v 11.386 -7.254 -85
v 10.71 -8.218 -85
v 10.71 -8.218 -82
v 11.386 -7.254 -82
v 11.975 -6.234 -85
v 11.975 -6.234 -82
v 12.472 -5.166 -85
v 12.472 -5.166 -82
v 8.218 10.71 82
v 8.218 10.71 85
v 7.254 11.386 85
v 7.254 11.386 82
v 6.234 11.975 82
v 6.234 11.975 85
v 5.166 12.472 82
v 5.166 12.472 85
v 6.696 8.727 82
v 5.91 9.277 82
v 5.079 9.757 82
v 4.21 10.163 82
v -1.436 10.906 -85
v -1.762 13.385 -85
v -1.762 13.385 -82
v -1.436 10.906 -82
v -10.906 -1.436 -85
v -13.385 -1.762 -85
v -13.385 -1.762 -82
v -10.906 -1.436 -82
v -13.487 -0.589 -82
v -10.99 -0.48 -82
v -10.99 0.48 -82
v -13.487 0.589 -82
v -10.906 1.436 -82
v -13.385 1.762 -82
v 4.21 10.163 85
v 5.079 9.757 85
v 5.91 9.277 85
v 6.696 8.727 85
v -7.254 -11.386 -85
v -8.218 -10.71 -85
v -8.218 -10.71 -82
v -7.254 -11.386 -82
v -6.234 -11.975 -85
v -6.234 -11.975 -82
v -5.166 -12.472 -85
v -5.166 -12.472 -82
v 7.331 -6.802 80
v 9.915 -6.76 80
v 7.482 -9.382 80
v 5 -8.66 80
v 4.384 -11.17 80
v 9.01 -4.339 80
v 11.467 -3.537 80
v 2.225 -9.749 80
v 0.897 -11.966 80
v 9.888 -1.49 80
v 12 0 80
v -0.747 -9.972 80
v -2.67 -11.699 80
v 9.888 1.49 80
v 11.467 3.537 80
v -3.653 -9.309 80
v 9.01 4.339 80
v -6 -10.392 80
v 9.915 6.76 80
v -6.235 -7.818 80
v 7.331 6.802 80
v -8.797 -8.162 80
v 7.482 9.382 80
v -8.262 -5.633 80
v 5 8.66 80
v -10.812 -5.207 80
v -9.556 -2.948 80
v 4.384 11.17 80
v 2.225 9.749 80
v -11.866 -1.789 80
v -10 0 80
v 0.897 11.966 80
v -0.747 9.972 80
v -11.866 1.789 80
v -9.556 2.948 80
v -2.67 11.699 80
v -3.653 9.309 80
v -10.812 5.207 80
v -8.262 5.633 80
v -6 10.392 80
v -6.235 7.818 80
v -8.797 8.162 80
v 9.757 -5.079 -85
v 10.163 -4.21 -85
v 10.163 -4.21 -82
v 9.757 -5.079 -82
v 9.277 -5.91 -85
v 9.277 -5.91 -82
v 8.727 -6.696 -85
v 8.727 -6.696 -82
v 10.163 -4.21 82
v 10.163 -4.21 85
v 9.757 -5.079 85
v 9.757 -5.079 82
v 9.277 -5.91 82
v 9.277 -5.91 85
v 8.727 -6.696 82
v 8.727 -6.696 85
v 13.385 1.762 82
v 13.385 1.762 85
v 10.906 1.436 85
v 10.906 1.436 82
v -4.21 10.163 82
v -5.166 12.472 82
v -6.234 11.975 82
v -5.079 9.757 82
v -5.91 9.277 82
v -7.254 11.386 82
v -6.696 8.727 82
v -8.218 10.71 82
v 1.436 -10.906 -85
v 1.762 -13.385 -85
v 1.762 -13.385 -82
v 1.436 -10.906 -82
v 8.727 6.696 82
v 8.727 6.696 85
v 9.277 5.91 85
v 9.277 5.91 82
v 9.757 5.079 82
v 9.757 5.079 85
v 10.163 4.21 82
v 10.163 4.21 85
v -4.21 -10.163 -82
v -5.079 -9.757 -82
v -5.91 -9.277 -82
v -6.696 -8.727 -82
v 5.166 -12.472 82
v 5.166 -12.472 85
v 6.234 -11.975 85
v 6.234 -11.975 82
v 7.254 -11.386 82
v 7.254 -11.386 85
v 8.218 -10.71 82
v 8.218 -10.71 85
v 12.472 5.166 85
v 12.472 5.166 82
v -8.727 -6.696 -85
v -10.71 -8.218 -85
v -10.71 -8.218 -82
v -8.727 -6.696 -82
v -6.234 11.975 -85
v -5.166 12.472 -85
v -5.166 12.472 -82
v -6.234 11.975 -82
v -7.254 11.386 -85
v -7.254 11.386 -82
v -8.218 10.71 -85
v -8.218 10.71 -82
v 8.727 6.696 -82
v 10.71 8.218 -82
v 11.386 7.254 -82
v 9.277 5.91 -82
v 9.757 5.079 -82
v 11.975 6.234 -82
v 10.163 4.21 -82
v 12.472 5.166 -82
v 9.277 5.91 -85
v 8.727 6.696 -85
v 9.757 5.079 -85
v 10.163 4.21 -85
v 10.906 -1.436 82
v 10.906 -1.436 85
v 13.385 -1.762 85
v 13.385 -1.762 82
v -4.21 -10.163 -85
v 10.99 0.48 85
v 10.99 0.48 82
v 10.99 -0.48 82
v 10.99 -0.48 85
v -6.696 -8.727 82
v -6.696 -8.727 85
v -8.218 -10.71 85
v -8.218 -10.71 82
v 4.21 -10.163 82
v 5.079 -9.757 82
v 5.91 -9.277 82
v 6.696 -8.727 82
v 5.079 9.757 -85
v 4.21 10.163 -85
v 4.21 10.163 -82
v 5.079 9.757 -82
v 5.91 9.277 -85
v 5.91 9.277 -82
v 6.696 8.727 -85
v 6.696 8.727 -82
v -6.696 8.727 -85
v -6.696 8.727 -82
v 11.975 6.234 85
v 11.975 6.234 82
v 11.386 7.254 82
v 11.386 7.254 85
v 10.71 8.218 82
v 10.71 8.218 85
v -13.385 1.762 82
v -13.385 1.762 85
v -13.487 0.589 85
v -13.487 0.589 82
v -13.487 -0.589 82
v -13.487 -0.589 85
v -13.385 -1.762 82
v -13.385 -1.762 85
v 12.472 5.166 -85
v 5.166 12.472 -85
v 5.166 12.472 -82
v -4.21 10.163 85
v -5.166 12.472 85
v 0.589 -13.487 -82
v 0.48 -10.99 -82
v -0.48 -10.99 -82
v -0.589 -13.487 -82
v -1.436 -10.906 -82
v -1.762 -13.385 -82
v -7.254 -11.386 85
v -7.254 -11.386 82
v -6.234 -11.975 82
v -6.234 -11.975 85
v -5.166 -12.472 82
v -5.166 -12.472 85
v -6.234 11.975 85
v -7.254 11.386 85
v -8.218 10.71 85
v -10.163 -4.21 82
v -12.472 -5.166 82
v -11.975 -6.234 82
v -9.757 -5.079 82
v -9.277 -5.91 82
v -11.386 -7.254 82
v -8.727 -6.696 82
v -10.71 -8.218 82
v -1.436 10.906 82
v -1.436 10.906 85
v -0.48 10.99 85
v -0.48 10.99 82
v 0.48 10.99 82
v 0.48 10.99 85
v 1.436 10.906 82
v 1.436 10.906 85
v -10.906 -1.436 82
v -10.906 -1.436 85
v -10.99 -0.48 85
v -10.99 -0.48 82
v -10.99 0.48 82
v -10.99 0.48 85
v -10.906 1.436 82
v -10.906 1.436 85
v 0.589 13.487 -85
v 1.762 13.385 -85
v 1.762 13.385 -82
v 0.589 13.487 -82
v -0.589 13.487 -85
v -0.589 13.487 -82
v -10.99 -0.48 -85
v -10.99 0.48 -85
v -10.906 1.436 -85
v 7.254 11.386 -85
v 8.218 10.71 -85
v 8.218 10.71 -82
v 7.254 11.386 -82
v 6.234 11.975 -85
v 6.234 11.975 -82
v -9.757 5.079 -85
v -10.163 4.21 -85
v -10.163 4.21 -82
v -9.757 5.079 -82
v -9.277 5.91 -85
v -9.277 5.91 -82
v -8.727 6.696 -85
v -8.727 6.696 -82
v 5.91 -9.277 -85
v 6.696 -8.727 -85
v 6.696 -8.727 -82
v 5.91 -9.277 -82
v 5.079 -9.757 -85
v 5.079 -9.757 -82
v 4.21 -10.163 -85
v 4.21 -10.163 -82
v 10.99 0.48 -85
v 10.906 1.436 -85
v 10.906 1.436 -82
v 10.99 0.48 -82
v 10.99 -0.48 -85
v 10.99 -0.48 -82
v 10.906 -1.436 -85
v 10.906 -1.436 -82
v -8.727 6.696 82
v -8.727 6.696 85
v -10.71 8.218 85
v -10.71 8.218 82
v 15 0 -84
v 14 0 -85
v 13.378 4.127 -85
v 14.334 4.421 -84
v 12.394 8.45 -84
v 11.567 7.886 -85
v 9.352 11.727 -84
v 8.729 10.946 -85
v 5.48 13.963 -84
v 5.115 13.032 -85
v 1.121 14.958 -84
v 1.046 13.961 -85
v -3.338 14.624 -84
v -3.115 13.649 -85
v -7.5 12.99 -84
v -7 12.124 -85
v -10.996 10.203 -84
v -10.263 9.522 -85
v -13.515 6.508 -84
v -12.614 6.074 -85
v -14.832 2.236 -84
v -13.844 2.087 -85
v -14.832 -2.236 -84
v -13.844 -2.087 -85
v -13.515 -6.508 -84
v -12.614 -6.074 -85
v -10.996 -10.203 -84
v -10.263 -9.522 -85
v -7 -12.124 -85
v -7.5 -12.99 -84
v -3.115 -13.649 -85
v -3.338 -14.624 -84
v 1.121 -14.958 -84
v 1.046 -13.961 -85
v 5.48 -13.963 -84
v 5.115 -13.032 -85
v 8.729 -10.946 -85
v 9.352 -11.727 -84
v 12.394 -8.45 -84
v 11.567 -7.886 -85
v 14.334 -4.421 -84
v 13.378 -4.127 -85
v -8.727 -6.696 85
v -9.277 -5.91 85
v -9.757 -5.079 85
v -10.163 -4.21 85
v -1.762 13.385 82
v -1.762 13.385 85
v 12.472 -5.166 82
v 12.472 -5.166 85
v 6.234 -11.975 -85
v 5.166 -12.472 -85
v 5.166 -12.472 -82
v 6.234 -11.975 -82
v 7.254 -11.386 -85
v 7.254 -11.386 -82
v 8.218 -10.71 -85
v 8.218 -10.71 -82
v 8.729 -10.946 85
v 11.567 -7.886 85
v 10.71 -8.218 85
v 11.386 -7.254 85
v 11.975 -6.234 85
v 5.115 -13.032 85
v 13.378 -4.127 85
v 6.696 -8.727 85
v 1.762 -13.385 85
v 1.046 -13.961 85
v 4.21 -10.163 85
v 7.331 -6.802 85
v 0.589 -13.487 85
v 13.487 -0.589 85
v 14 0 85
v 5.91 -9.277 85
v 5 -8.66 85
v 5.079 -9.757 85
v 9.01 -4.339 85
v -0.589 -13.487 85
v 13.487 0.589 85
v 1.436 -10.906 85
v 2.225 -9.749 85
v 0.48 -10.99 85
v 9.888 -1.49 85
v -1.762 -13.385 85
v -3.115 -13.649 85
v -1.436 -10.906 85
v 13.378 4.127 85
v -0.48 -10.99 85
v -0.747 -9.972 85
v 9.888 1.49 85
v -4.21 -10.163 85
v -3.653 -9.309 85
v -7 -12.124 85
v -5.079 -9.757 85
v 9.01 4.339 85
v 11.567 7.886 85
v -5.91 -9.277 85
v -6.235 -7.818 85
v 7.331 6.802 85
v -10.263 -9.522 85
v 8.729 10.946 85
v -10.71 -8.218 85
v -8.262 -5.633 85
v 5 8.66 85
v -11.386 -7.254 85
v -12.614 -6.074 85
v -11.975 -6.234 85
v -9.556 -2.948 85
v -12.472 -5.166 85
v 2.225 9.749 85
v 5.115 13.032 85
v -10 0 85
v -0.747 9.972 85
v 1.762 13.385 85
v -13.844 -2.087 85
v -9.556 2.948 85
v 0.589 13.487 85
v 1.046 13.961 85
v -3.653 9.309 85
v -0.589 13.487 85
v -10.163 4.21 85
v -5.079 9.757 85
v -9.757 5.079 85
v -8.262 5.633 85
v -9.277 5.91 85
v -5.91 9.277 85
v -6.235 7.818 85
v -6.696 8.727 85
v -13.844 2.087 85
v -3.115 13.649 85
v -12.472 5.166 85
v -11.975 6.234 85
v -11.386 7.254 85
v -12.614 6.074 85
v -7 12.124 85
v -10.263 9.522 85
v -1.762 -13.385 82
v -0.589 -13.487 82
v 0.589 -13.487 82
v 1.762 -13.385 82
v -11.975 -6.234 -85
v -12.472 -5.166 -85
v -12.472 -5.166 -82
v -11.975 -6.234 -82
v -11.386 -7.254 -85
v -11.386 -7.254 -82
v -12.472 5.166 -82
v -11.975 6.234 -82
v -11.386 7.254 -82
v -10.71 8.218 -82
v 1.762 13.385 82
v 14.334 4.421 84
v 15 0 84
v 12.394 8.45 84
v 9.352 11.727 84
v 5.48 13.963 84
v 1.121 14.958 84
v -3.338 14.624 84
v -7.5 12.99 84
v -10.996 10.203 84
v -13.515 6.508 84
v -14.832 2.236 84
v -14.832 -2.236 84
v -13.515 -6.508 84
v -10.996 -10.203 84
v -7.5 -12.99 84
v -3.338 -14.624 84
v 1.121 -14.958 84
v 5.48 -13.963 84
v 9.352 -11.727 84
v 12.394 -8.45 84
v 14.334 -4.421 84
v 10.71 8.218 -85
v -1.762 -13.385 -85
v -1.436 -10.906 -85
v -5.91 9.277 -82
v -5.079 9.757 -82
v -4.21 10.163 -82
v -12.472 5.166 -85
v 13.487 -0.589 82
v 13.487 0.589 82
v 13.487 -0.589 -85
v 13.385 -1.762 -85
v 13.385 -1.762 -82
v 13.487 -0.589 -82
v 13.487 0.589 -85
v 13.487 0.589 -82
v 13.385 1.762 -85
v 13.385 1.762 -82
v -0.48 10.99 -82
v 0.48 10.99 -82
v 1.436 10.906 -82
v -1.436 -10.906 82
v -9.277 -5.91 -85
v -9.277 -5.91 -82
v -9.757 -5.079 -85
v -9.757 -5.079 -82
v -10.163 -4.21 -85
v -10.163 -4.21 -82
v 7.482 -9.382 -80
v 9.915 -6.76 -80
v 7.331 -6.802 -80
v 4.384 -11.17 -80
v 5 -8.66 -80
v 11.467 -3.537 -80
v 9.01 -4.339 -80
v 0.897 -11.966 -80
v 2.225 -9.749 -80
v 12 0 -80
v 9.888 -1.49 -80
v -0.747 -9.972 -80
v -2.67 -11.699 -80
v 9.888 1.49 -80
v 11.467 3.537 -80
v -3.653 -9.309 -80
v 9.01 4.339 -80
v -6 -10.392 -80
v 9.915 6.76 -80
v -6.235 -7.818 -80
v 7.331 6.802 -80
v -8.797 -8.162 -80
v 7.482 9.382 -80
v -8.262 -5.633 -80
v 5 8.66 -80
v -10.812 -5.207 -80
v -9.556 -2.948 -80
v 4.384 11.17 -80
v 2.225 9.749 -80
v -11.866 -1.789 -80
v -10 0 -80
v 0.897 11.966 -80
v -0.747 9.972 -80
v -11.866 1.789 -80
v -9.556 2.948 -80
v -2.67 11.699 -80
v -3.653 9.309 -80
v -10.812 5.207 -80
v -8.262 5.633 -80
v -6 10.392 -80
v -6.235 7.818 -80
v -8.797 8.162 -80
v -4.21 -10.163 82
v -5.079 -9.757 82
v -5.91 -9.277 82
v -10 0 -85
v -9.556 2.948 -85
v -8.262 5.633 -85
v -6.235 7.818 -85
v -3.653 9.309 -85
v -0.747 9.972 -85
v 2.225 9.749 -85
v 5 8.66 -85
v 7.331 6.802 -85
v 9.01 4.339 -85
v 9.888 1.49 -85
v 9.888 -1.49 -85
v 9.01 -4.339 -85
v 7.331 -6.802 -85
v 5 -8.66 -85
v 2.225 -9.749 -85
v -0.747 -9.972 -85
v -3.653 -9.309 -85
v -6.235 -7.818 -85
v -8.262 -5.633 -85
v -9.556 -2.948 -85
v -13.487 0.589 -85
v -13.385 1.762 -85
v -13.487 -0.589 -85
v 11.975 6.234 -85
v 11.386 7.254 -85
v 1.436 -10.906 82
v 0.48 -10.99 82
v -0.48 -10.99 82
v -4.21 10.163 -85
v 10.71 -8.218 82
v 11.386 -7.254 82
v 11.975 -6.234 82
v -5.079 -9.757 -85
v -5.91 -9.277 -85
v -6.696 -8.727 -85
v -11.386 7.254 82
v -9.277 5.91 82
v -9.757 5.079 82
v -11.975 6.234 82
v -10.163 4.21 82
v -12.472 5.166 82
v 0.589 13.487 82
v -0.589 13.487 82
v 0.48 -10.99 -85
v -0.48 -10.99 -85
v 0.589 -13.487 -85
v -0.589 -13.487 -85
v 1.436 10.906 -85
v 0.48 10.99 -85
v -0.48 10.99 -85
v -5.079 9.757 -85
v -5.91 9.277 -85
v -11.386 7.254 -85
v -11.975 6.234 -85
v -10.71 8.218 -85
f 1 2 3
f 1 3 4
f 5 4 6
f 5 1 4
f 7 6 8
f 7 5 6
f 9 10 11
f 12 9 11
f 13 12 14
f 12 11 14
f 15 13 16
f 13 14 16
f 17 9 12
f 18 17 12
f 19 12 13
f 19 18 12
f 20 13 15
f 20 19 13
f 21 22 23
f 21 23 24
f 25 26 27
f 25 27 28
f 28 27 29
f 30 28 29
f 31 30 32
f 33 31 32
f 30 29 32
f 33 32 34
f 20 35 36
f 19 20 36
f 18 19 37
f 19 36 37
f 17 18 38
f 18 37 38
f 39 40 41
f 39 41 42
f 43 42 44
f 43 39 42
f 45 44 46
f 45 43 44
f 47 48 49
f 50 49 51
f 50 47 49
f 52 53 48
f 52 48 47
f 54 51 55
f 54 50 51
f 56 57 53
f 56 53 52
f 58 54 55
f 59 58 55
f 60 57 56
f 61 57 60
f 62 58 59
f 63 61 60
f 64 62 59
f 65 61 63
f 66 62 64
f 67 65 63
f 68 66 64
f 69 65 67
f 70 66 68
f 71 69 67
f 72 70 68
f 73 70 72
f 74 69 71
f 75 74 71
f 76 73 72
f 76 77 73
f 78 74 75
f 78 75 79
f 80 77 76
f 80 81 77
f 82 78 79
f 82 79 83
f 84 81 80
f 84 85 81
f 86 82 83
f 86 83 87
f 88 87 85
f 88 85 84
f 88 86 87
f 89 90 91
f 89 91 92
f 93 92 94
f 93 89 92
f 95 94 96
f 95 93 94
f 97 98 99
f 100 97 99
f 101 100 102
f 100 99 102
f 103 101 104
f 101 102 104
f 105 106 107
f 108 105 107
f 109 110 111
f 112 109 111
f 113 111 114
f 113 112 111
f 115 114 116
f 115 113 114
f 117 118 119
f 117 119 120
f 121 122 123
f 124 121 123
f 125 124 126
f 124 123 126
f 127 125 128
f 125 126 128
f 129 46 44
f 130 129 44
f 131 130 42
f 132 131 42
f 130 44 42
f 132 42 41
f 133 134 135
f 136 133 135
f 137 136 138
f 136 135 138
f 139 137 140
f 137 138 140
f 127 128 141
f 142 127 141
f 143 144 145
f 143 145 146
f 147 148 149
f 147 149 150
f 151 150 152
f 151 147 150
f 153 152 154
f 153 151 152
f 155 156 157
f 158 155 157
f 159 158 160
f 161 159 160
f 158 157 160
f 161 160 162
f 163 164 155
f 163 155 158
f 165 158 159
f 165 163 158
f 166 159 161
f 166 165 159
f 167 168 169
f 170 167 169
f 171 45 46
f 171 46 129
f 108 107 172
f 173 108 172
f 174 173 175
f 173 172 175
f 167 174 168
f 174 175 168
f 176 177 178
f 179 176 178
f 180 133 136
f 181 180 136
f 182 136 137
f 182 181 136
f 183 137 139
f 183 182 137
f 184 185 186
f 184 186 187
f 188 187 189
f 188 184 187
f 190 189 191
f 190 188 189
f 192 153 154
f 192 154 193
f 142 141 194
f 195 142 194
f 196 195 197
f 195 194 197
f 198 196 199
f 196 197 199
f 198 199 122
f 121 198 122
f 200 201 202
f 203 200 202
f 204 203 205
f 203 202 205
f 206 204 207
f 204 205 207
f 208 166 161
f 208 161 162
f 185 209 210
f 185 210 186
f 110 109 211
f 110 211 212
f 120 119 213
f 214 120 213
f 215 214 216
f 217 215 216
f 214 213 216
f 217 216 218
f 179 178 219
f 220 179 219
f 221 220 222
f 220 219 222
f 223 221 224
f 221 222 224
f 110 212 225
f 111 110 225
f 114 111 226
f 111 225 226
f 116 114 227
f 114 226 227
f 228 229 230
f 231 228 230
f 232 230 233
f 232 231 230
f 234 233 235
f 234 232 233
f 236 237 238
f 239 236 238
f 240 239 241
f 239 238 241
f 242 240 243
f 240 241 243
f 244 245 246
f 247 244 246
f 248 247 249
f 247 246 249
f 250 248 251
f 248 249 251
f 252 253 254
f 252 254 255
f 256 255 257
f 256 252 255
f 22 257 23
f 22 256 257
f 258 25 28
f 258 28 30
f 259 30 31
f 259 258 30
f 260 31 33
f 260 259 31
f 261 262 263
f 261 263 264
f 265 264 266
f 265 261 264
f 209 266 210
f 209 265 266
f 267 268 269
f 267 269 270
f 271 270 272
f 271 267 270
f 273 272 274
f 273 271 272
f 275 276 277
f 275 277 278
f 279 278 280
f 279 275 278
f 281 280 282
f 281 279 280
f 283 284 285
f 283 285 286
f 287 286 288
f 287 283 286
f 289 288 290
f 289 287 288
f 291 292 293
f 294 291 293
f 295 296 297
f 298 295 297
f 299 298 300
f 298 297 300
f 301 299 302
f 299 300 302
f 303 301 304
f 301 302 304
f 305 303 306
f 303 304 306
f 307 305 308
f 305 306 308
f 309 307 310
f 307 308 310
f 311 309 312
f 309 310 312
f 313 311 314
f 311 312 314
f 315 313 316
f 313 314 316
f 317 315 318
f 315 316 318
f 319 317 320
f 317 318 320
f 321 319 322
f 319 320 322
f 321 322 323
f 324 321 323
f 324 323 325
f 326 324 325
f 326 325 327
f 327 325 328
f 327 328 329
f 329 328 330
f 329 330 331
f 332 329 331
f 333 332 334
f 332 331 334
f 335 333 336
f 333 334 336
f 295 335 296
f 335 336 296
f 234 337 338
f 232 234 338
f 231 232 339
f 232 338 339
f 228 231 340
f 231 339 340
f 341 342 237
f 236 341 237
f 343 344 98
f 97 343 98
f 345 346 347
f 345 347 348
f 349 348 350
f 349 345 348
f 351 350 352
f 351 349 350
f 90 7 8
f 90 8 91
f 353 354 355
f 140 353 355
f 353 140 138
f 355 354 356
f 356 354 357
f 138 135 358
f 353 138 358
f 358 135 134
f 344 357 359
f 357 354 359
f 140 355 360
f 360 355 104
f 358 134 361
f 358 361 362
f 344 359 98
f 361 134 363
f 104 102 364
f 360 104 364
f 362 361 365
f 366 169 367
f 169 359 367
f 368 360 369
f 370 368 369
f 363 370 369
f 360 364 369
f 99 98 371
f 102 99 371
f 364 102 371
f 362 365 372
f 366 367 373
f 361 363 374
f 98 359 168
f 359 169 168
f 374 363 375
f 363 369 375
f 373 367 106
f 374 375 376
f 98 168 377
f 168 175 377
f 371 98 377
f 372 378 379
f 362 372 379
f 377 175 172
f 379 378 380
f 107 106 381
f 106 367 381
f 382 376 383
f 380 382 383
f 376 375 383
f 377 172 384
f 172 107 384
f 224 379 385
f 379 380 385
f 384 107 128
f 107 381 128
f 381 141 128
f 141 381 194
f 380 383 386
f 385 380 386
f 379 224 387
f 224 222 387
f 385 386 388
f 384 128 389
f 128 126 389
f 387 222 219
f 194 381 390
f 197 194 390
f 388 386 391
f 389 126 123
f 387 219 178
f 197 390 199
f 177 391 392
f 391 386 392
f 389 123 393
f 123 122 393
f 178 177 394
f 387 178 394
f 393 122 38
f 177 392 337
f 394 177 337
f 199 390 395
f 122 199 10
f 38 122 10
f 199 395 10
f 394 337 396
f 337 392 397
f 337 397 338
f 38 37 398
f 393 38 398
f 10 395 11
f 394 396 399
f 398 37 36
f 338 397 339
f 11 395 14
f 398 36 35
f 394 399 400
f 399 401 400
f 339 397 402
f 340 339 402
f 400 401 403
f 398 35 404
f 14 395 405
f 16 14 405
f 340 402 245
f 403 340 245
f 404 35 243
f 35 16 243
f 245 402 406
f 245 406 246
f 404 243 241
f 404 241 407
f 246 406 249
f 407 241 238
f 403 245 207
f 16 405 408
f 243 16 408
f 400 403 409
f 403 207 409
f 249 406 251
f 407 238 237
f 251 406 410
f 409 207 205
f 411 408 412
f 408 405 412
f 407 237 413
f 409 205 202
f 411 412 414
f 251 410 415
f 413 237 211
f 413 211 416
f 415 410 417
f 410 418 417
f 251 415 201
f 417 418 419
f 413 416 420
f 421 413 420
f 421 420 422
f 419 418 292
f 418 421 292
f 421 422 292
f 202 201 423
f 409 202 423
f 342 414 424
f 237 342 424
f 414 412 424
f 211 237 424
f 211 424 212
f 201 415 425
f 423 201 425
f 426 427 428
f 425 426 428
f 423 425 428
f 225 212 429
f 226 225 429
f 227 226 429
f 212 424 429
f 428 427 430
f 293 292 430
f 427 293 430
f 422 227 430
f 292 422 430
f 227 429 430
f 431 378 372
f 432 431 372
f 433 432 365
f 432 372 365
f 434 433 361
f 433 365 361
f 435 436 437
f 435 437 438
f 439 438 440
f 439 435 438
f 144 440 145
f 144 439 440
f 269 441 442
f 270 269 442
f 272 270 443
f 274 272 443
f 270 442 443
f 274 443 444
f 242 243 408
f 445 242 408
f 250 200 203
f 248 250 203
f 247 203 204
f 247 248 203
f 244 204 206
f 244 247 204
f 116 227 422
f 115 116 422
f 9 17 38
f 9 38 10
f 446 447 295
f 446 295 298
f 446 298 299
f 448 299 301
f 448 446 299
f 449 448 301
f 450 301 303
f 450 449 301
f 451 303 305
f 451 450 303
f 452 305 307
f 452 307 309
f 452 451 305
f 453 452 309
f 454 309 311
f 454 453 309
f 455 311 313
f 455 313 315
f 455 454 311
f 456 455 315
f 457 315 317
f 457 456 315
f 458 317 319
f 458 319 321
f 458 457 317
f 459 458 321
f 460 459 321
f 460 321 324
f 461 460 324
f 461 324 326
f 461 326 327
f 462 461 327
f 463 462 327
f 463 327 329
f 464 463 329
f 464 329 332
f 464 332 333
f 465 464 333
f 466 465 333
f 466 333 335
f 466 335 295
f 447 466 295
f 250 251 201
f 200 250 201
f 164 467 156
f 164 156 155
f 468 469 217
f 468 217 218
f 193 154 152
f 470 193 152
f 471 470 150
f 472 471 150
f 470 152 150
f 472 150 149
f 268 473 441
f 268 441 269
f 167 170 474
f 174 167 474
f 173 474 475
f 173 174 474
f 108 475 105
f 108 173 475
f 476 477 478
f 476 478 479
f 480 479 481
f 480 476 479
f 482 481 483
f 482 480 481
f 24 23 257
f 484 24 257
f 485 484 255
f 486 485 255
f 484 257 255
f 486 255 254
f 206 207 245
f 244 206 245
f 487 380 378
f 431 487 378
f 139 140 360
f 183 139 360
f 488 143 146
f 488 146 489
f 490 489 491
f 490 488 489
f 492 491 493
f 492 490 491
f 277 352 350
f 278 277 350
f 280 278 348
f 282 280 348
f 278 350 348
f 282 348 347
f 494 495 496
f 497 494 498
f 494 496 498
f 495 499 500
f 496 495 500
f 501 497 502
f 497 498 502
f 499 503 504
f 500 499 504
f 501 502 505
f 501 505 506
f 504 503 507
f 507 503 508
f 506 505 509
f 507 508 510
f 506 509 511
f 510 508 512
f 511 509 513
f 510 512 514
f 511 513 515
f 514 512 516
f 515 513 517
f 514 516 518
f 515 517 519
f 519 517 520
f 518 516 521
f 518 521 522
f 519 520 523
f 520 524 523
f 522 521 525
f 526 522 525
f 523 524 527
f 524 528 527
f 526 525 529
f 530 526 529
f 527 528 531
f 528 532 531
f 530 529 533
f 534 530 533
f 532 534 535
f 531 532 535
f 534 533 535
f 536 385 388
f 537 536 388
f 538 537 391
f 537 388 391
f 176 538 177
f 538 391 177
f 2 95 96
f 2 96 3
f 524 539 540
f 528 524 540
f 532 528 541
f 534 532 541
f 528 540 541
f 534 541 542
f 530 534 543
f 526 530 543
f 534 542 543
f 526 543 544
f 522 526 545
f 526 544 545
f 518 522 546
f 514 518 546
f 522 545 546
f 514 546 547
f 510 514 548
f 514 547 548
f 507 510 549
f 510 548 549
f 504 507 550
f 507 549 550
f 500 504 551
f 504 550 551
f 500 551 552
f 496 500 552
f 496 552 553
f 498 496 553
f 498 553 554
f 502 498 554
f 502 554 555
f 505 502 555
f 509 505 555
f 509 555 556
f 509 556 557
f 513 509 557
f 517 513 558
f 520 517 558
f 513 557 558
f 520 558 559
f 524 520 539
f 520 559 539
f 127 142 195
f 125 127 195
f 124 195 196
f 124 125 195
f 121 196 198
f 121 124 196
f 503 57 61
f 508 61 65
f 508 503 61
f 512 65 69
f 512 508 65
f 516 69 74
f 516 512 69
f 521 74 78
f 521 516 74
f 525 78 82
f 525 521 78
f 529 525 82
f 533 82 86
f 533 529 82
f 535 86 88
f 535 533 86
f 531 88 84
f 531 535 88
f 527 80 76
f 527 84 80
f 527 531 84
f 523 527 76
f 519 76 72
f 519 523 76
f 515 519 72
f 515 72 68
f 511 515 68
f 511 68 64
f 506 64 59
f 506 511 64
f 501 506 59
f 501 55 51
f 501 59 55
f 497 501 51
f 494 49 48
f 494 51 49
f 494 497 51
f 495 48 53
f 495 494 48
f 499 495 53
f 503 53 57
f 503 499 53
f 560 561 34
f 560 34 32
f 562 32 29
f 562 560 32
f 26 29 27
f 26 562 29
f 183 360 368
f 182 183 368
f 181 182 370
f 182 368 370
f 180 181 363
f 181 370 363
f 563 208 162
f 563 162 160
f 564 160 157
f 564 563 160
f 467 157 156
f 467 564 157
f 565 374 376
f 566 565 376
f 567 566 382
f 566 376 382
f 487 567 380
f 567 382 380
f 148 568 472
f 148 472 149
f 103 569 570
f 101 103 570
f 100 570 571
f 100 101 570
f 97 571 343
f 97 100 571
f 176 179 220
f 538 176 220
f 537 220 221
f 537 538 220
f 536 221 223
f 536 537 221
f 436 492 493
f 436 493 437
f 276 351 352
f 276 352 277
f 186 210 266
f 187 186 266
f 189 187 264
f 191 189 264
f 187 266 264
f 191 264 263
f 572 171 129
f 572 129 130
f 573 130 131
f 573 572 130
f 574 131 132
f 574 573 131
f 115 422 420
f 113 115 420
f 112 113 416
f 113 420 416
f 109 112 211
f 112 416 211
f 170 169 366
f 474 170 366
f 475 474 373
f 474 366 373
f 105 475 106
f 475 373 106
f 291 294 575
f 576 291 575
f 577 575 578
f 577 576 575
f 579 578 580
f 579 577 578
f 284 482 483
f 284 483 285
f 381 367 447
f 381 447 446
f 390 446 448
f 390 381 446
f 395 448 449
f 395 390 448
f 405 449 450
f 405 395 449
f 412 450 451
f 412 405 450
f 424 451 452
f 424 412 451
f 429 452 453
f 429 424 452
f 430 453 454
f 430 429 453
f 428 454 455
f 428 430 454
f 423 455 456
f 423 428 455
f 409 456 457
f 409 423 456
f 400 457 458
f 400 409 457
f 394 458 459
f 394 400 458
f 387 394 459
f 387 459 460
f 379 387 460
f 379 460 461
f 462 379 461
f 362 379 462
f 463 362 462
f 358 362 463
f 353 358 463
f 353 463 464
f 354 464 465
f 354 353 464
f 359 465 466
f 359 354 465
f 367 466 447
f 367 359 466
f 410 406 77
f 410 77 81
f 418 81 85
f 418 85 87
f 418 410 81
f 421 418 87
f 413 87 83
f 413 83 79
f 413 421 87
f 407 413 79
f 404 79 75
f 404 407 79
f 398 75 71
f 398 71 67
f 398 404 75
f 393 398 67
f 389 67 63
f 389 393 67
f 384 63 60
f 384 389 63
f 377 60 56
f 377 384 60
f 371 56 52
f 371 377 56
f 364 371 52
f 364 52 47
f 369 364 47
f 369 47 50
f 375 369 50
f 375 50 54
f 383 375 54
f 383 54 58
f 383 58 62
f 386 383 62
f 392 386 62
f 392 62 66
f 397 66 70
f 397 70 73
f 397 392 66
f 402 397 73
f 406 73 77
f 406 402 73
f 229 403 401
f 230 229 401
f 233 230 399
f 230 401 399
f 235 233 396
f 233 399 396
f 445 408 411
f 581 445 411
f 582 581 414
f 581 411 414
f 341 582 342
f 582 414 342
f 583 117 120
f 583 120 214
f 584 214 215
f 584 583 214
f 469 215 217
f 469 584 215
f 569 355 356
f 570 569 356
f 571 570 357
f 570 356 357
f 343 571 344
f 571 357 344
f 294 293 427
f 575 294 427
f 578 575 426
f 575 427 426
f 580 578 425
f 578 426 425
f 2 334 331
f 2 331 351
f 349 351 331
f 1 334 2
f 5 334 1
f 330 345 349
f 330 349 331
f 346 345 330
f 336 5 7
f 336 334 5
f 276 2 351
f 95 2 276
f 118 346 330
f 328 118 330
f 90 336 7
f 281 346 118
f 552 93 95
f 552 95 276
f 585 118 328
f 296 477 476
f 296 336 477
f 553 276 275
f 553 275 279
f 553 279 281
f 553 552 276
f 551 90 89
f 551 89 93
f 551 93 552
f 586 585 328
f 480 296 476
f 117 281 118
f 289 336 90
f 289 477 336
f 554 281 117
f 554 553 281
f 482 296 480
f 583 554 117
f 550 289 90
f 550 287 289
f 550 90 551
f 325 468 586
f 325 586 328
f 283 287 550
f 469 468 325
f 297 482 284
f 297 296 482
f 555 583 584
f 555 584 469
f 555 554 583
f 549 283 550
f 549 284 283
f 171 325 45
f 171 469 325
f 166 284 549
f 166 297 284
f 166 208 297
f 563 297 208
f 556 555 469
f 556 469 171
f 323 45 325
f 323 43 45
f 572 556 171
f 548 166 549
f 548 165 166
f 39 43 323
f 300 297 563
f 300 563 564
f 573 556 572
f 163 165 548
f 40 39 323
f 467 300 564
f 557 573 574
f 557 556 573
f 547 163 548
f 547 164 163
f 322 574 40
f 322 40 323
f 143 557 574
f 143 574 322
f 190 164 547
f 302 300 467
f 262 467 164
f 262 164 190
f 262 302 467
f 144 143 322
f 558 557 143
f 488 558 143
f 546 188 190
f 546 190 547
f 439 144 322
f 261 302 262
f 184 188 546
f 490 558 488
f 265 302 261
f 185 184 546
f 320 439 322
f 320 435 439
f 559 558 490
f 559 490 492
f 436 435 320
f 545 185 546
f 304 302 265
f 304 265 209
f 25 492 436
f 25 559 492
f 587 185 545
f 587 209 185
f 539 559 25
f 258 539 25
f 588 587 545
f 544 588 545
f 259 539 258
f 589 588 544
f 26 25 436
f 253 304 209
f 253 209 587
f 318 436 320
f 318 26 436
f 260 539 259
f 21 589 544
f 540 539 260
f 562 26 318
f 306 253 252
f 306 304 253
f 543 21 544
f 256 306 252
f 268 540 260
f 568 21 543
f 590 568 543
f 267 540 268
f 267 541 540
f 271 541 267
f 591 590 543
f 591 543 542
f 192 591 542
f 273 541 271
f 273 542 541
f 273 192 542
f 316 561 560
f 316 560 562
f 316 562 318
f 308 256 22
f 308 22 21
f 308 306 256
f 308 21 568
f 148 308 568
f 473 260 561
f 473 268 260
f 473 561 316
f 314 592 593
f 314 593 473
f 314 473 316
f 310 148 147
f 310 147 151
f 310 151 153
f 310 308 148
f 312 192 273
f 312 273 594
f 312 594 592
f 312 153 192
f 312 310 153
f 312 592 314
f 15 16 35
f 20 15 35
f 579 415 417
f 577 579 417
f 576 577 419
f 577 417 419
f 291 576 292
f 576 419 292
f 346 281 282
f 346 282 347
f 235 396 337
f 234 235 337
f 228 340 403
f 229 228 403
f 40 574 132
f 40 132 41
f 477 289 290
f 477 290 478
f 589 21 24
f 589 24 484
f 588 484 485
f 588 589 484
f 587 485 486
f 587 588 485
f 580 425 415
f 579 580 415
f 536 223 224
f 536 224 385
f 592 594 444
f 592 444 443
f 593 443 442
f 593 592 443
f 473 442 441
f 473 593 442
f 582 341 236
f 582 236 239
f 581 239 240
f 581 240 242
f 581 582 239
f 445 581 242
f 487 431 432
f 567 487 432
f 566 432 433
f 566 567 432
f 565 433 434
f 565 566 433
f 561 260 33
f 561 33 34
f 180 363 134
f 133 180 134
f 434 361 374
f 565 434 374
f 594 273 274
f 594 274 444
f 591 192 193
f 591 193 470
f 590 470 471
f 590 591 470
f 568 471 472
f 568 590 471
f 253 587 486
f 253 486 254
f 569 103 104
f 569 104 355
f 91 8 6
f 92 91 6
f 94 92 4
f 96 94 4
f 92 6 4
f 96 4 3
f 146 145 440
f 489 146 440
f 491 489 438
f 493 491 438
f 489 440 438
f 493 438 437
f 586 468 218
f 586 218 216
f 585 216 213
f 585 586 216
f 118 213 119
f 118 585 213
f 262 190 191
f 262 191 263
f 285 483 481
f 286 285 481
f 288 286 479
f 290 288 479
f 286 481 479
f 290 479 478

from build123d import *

# Parameters (mm, degrees)
SKETCH1_R             = 15
SKETCH1_R_2           = 12
BOSS_EXTRUDE1_DEPTH   = 85
CHAMFER1_SIZE         = 1
SKETCH2_R             = 12
SKETCH2_R_2           = 10
BOSS_EXTRUDE2_DEPTH   = 5
CUT_EXTRUDE1_DEPTH    = 3
CIRPATTERN1_COUNT     = 12
MIRROR2_COPY_1_DEPTH  = 3
MIRROR2_COPY_2_DEPTH  = 3
MIRROR2_COPY_3_DEPTH  = 3
MIRROR2_COPY_4_DEPTH  = 3
MIRROR2_COPY_5_DEPTH  = 3
MIRROR2_COPY_6_DEPTH  = 3
MIRROR2_COPY_7_DEPTH  = 3
MIRROR2_COPY_8_DEPTH  = 3
MIRROR2_COPY_9_DEPTH  = 3
MIRROR2_COPY_10_DEPTH = 3
MIRROR2_COPY_11_DEPTH = 3


with BuildPart() as part:
    # Sketch1 → Boss-Extrude1 (new, symmetric)
    with BuildSketch(Plane.XY):
        Circle(SKETCH1_R)
        Circle(SKETCH1_R_2, mode=Mode.SUBTRACT)
    extrude(amount=BOSS_EXTRUDE1_DEPTH, both=True)

    # Chamfer1
    chamfer1_edges = [part.edges().sort_by_distance(p)[0] for p in [
        (-15, 0, -85),
        (-15, 0, 85),
    ]]
    chamfer(chamfer1_edges, length=CHAMFER1_SIZE)

    # Sketch2 → Boss-Extrude2 (add)
    with BuildSketch(Plane(origin=(0, 0, -85), x_dir=(-1, 0, 0), z_dir=(0, 0, -1))):
        Circle(SKETCH2_R)
        Circle(SKETCH2_R_2, mode=Mode.SUBTRACT)
    boss_extrude2 = extrude(amount=-BOSS_EXTRUDE2_DEPTH)

    # Mirror1: Boss-Extrude2 across plane
    add(boss_extrude2.mirror(Plane.XY))

    # Sketch3 → Cut-Extrude1 (cut)
    with BuildSketch(Plane(origin=(0, 0, -85), x_dir=(-1, 0, 0), z_dir=(0, 0, -1))):
        with BuildLine():
            Line((-1.435788114, 10.905893475), (-1.762103595, 13.384505629))
            ThreePointArc((-1.762103595, 13.384505629), (0, 13.5), (1.762103595, 13.384505629))
            Line((1.762103595, 13.384505629), (1.435788114, 10.905893475))
            ThreePointArc((1.435788114, 10.905893475), (0, 11), (-1.435788114, 10.905893475))
        make_face()
    cut_extrude1 = extrude(amount=-CUT_EXTRUDE1_DEPTH, mode=Mode.SUBTRACT)

    # CirPattern1: Cut-Extrude1 ×12 about axis
    cirpattern1_axis = Axis((0, 0, 0), (0, 0, 1))
    for i in range(1, CIRPATTERN1_COUNT):
        add(cut_extrude1.rotate(cirpattern1_axis, i * 360 / CIRPATTERN1_COUNT), mode=Mode.SUBTRACT)

    # Mirror2: Cut-Extrude1 across plane
    add(cut_extrude1.mirror(Plane.XY), mode=Mode.SUBTRACT)

    # Mirror2 copy 1 sketch → Mirror2 copy 1 (cut)
    with BuildSketch(Plane(origin=(0, 0, 85), x_dir=(-0.8660254037844387, -0.49999999999999994, 0), z_dir=(0, 0, 1))):
        with BuildLine():
            Line((-1.435788114, -10.905893475), (-1.762103595, -13.384505629))
            ThreePointArc((-1.762103595, -13.384505629), (0, -13.5), (1.762103595, -13.384505629))
            Line((1.762103595, -13.384505629), (1.435788114, -10.905893475))
            ThreePointArc((1.435788114, -10.905893475), (0, -11), (-1.435788114, -10.905893475))
        make_face()
    extrude(amount=-MIRROR2_COPY_1_DEPTH, mode=Mode.SUBTRACT)

    # Mirror2 copy 2 sketch → Mirror2 copy 2 (cut)
    with BuildSketch(Plane(origin=(0, 0, 85), x_dir=(-0.5000000000000001, -0.8660254037844386, 0), z_dir=(0, 0, 1))):
        with BuildLine():
            Line((-1.435788114, -10.905893475), (-1.762103595, -13.384505629))
            ThreePointArc((-1.762103595, -13.384505629), (0, -13.5), (1.762103595, -13.384505629))
            Line((1.762103595, -13.384505629), (1.435788114, -10.905893475))
            ThreePointArc((1.435788114, -10.905893475), (0, -11), (-1.435788114, -10.905893475))
        make_face()
    extrude(amount=-MIRROR2_COPY_2_DEPTH, mode=Mode.SUBTRACT)

    # Mirror2 copy 3 sketch → Mirror2 copy 3 (cut)
    with BuildSketch(Plane(origin=(0, 0, 85), x_dir=(0, -1, 0), z_dir=(0, 0, 1))):
        with BuildLine():
            Line((-1.435788114, -10.905893475), (-1.762103595, -13.384505629))
            ThreePointArc((-1.762103595, -13.384505629), (0, -13.5), (1.762103595, -13.384505629))
            Line((1.762103595, -13.384505629), (1.435788114, -10.905893475))
            ThreePointArc((1.435788114, -10.905893475), (0, -11), (-1.435788114, -10.905893475))
        make_face()
    extrude(amount=-MIRROR2_COPY_3_DEPTH, mode=Mode.SUBTRACT)

    # Mirror2 copy 4 sketch → Mirror2 copy 4 (cut)
    with BuildSketch(Plane(origin=(0, 0, 85), x_dir=(0.4999999999999998, -0.8660254037844387, 0), z_dir=(0, 0, 1))):
        with BuildLine():
            Line((-1.435788114, -10.905893475), (-1.762103595, -13.384505629))
            ThreePointArc((-1.762103595, -13.384505629), (0, -13.5), (1.762103595, -13.384505629))
            Line((1.762103595, -13.384505629), (1.435788114, -10.905893475))
            ThreePointArc((1.435788114, -10.905893475), (0, -11), (-1.435788114, -10.905893475))
        make_face()
    extrude(amount=-MIRROR2_COPY_4_DEPTH, mode=Mode.SUBTRACT)

    # Mirror2 copy 5 sketch → Mirror2 copy 5 (cut)
    with BuildSketch(Plane(origin=(0, 0, 85), x_dir=(0.8660254037844387, -0.49999999999999994, 0), z_dir=(0, 0, 1))):
        with BuildLine():
            Line((-1.435788114, -10.905893475), (-1.762103595, -13.384505629))
            ThreePointArc((-1.762103595, -13.384505629), (0, -13.5), (1.762103595, -13.384505629))
            Line((1.762103595, -13.384505629), (1.435788114, -10.905893475))
            ThreePointArc((1.435788114, -10.905893475), (0, -11), (-1.435788114, -10.905893475))
        make_face()
    extrude(amount=-MIRROR2_COPY_5_DEPTH, mode=Mode.SUBTRACT)

    # Mirror2 copy 6 sketch → Mirror2 copy 6 (cut)
    with BuildSketch(Plane.XY.offset(85)):
        with BuildLine():
            Line((-1.435788114, -10.905893475), (-1.762103595, -13.384505629))
            ThreePointArc((-1.762103595, -13.384505629), (0, -13.5), (1.762103595, -13.384505629))
            Line((1.762103595, -13.384505629), (1.435788114, -10.905893475))
            ThreePointArc((1.435788114, -10.905893475), (0, -11), (-1.435788114, -10.905893475))
        make_face()
    extrude(amount=-MIRROR2_COPY_6_DEPTH, mode=Mode.SUBTRACT)

    # Mirror2 copy 7 sketch → Mirror2 copy 7 (cut)
    with BuildSketch(Plane(origin=(0, 0, 85), x_dir=(0.8660254037844386, 0.5000000000000001, 0), z_dir=(0, 0, 1))):
        with BuildLine():
            Line((-1.435788114, -10.905893475), (-1.762103595, -13.384505629))
            ThreePointArc((-1.762103595, -13.384505629), (0, -13.5), (1.762103595, -13.384505629))
            Line((1.762103595, -13.384505629), (1.435788114, -10.905893475))
            ThreePointArc((1.435788114, -10.905893475), (0, -11), (-1.435788114, -10.905893475))
        make_face()
    extrude(amount=-MIRROR2_COPY_7_DEPTH, mode=Mode.SUBTRACT)

    # Mirror2 copy 8 sketch → Mirror2 copy 8 (cut)
    with BuildSketch(Plane(origin=(0, 0, 85), x_dir=(0.5000000000000004, 0.8660254037844384, 0), z_dir=(0, 0, 1))):
        with BuildLine():
            Line((-1.435788114, -10.905893475), (-1.762103595, -13.384505629))
            ThreePointArc((-1.762103595, -13.384505629), (0, -13.5), (1.762103595, -13.384505629))
            Line((1.762103595, -13.384505629), (1.435788114, -10.905893475))
            ThreePointArc((1.435788114, -10.905893475), (0, -11), (-1.435788114, -10.905893475))
        make_face()
    extrude(amount=-MIRROR2_COPY_8_DEPTH, mode=Mode.SUBTRACT)

    # Mirror2 copy 9 sketch → Mirror2 copy 9 (cut)
    with BuildSketch(Plane(origin=(0, 0, 85), x_dir=(0, 1, 0), z_dir=(0, 0, 1))):
        with BuildLine():
            Line((-1.435788114, -10.905893475), (-1.762103595, -13.384505629))
            ThreePointArc((-1.762103595, -13.384505629), (0, -13.5), (1.762103595, -13.384505629))
            Line((1.762103595, -13.384505629), (1.435788114, -10.905893475))
            ThreePointArc((1.435788114, -10.905893475), (0, -11), (-1.435788114, -10.905893475))
        make_face()
    extrude(amount=-MIRROR2_COPY_9_DEPTH, mode=Mode.SUBTRACT)

    # Mirror2 copy 10 sketch → Mirror2 copy 10 (cut)
    with BuildSketch(Plane(origin=(0, 0, 85), x_dir=(-0.5000000000000001, 0.8660254037844386, 0), z_dir=(0, 0, 1))):
        with BuildLine():
            Line((-1.435788114, -10.905893475), (-1.762103595, -13.384505629))
            ThreePointArc((-1.762103595, -13.384505629), (0, -13.5), (1.762103595, -13.384505629))
            Line((1.762103595, -13.384505629), (1.435788114, -10.905893475))
            ThreePointArc((1.435788114, -10.905893475), (0, -11), (-1.435788114, -10.905893475))
        make_face()
    extrude(amount=-MIRROR2_COPY_10_DEPTH, mode=Mode.SUBTRACT)

    # Mirror2 copy 11 sketch → Mirror2 copy 11 (cut)
    with BuildSketch(Plane(origin=(0, 0, 85), x_dir=(-0.8660254037844384, 0.5000000000000004, 0), z_dir=(0, 0, 1))):
        with BuildLine():
            Line((-1.435788114, -10.905893475), (-1.762103595, -13.384505629))
            ThreePointArc((-1.762103595, -13.384505629), (0, -13.5), (1.762103595, -13.384505629))
            Line((1.762103595, -13.384505629), (1.435788114, -10.905893475))
            ThreePointArc((1.435788114, -10.905893475), (0, -11), (-1.435788114, -10.905893475))
        make_face()
    extrude(amount=-MIRROR2_COPY_11_DEPTH, mode=Mode.SUBTRACT)


solid = part.part
